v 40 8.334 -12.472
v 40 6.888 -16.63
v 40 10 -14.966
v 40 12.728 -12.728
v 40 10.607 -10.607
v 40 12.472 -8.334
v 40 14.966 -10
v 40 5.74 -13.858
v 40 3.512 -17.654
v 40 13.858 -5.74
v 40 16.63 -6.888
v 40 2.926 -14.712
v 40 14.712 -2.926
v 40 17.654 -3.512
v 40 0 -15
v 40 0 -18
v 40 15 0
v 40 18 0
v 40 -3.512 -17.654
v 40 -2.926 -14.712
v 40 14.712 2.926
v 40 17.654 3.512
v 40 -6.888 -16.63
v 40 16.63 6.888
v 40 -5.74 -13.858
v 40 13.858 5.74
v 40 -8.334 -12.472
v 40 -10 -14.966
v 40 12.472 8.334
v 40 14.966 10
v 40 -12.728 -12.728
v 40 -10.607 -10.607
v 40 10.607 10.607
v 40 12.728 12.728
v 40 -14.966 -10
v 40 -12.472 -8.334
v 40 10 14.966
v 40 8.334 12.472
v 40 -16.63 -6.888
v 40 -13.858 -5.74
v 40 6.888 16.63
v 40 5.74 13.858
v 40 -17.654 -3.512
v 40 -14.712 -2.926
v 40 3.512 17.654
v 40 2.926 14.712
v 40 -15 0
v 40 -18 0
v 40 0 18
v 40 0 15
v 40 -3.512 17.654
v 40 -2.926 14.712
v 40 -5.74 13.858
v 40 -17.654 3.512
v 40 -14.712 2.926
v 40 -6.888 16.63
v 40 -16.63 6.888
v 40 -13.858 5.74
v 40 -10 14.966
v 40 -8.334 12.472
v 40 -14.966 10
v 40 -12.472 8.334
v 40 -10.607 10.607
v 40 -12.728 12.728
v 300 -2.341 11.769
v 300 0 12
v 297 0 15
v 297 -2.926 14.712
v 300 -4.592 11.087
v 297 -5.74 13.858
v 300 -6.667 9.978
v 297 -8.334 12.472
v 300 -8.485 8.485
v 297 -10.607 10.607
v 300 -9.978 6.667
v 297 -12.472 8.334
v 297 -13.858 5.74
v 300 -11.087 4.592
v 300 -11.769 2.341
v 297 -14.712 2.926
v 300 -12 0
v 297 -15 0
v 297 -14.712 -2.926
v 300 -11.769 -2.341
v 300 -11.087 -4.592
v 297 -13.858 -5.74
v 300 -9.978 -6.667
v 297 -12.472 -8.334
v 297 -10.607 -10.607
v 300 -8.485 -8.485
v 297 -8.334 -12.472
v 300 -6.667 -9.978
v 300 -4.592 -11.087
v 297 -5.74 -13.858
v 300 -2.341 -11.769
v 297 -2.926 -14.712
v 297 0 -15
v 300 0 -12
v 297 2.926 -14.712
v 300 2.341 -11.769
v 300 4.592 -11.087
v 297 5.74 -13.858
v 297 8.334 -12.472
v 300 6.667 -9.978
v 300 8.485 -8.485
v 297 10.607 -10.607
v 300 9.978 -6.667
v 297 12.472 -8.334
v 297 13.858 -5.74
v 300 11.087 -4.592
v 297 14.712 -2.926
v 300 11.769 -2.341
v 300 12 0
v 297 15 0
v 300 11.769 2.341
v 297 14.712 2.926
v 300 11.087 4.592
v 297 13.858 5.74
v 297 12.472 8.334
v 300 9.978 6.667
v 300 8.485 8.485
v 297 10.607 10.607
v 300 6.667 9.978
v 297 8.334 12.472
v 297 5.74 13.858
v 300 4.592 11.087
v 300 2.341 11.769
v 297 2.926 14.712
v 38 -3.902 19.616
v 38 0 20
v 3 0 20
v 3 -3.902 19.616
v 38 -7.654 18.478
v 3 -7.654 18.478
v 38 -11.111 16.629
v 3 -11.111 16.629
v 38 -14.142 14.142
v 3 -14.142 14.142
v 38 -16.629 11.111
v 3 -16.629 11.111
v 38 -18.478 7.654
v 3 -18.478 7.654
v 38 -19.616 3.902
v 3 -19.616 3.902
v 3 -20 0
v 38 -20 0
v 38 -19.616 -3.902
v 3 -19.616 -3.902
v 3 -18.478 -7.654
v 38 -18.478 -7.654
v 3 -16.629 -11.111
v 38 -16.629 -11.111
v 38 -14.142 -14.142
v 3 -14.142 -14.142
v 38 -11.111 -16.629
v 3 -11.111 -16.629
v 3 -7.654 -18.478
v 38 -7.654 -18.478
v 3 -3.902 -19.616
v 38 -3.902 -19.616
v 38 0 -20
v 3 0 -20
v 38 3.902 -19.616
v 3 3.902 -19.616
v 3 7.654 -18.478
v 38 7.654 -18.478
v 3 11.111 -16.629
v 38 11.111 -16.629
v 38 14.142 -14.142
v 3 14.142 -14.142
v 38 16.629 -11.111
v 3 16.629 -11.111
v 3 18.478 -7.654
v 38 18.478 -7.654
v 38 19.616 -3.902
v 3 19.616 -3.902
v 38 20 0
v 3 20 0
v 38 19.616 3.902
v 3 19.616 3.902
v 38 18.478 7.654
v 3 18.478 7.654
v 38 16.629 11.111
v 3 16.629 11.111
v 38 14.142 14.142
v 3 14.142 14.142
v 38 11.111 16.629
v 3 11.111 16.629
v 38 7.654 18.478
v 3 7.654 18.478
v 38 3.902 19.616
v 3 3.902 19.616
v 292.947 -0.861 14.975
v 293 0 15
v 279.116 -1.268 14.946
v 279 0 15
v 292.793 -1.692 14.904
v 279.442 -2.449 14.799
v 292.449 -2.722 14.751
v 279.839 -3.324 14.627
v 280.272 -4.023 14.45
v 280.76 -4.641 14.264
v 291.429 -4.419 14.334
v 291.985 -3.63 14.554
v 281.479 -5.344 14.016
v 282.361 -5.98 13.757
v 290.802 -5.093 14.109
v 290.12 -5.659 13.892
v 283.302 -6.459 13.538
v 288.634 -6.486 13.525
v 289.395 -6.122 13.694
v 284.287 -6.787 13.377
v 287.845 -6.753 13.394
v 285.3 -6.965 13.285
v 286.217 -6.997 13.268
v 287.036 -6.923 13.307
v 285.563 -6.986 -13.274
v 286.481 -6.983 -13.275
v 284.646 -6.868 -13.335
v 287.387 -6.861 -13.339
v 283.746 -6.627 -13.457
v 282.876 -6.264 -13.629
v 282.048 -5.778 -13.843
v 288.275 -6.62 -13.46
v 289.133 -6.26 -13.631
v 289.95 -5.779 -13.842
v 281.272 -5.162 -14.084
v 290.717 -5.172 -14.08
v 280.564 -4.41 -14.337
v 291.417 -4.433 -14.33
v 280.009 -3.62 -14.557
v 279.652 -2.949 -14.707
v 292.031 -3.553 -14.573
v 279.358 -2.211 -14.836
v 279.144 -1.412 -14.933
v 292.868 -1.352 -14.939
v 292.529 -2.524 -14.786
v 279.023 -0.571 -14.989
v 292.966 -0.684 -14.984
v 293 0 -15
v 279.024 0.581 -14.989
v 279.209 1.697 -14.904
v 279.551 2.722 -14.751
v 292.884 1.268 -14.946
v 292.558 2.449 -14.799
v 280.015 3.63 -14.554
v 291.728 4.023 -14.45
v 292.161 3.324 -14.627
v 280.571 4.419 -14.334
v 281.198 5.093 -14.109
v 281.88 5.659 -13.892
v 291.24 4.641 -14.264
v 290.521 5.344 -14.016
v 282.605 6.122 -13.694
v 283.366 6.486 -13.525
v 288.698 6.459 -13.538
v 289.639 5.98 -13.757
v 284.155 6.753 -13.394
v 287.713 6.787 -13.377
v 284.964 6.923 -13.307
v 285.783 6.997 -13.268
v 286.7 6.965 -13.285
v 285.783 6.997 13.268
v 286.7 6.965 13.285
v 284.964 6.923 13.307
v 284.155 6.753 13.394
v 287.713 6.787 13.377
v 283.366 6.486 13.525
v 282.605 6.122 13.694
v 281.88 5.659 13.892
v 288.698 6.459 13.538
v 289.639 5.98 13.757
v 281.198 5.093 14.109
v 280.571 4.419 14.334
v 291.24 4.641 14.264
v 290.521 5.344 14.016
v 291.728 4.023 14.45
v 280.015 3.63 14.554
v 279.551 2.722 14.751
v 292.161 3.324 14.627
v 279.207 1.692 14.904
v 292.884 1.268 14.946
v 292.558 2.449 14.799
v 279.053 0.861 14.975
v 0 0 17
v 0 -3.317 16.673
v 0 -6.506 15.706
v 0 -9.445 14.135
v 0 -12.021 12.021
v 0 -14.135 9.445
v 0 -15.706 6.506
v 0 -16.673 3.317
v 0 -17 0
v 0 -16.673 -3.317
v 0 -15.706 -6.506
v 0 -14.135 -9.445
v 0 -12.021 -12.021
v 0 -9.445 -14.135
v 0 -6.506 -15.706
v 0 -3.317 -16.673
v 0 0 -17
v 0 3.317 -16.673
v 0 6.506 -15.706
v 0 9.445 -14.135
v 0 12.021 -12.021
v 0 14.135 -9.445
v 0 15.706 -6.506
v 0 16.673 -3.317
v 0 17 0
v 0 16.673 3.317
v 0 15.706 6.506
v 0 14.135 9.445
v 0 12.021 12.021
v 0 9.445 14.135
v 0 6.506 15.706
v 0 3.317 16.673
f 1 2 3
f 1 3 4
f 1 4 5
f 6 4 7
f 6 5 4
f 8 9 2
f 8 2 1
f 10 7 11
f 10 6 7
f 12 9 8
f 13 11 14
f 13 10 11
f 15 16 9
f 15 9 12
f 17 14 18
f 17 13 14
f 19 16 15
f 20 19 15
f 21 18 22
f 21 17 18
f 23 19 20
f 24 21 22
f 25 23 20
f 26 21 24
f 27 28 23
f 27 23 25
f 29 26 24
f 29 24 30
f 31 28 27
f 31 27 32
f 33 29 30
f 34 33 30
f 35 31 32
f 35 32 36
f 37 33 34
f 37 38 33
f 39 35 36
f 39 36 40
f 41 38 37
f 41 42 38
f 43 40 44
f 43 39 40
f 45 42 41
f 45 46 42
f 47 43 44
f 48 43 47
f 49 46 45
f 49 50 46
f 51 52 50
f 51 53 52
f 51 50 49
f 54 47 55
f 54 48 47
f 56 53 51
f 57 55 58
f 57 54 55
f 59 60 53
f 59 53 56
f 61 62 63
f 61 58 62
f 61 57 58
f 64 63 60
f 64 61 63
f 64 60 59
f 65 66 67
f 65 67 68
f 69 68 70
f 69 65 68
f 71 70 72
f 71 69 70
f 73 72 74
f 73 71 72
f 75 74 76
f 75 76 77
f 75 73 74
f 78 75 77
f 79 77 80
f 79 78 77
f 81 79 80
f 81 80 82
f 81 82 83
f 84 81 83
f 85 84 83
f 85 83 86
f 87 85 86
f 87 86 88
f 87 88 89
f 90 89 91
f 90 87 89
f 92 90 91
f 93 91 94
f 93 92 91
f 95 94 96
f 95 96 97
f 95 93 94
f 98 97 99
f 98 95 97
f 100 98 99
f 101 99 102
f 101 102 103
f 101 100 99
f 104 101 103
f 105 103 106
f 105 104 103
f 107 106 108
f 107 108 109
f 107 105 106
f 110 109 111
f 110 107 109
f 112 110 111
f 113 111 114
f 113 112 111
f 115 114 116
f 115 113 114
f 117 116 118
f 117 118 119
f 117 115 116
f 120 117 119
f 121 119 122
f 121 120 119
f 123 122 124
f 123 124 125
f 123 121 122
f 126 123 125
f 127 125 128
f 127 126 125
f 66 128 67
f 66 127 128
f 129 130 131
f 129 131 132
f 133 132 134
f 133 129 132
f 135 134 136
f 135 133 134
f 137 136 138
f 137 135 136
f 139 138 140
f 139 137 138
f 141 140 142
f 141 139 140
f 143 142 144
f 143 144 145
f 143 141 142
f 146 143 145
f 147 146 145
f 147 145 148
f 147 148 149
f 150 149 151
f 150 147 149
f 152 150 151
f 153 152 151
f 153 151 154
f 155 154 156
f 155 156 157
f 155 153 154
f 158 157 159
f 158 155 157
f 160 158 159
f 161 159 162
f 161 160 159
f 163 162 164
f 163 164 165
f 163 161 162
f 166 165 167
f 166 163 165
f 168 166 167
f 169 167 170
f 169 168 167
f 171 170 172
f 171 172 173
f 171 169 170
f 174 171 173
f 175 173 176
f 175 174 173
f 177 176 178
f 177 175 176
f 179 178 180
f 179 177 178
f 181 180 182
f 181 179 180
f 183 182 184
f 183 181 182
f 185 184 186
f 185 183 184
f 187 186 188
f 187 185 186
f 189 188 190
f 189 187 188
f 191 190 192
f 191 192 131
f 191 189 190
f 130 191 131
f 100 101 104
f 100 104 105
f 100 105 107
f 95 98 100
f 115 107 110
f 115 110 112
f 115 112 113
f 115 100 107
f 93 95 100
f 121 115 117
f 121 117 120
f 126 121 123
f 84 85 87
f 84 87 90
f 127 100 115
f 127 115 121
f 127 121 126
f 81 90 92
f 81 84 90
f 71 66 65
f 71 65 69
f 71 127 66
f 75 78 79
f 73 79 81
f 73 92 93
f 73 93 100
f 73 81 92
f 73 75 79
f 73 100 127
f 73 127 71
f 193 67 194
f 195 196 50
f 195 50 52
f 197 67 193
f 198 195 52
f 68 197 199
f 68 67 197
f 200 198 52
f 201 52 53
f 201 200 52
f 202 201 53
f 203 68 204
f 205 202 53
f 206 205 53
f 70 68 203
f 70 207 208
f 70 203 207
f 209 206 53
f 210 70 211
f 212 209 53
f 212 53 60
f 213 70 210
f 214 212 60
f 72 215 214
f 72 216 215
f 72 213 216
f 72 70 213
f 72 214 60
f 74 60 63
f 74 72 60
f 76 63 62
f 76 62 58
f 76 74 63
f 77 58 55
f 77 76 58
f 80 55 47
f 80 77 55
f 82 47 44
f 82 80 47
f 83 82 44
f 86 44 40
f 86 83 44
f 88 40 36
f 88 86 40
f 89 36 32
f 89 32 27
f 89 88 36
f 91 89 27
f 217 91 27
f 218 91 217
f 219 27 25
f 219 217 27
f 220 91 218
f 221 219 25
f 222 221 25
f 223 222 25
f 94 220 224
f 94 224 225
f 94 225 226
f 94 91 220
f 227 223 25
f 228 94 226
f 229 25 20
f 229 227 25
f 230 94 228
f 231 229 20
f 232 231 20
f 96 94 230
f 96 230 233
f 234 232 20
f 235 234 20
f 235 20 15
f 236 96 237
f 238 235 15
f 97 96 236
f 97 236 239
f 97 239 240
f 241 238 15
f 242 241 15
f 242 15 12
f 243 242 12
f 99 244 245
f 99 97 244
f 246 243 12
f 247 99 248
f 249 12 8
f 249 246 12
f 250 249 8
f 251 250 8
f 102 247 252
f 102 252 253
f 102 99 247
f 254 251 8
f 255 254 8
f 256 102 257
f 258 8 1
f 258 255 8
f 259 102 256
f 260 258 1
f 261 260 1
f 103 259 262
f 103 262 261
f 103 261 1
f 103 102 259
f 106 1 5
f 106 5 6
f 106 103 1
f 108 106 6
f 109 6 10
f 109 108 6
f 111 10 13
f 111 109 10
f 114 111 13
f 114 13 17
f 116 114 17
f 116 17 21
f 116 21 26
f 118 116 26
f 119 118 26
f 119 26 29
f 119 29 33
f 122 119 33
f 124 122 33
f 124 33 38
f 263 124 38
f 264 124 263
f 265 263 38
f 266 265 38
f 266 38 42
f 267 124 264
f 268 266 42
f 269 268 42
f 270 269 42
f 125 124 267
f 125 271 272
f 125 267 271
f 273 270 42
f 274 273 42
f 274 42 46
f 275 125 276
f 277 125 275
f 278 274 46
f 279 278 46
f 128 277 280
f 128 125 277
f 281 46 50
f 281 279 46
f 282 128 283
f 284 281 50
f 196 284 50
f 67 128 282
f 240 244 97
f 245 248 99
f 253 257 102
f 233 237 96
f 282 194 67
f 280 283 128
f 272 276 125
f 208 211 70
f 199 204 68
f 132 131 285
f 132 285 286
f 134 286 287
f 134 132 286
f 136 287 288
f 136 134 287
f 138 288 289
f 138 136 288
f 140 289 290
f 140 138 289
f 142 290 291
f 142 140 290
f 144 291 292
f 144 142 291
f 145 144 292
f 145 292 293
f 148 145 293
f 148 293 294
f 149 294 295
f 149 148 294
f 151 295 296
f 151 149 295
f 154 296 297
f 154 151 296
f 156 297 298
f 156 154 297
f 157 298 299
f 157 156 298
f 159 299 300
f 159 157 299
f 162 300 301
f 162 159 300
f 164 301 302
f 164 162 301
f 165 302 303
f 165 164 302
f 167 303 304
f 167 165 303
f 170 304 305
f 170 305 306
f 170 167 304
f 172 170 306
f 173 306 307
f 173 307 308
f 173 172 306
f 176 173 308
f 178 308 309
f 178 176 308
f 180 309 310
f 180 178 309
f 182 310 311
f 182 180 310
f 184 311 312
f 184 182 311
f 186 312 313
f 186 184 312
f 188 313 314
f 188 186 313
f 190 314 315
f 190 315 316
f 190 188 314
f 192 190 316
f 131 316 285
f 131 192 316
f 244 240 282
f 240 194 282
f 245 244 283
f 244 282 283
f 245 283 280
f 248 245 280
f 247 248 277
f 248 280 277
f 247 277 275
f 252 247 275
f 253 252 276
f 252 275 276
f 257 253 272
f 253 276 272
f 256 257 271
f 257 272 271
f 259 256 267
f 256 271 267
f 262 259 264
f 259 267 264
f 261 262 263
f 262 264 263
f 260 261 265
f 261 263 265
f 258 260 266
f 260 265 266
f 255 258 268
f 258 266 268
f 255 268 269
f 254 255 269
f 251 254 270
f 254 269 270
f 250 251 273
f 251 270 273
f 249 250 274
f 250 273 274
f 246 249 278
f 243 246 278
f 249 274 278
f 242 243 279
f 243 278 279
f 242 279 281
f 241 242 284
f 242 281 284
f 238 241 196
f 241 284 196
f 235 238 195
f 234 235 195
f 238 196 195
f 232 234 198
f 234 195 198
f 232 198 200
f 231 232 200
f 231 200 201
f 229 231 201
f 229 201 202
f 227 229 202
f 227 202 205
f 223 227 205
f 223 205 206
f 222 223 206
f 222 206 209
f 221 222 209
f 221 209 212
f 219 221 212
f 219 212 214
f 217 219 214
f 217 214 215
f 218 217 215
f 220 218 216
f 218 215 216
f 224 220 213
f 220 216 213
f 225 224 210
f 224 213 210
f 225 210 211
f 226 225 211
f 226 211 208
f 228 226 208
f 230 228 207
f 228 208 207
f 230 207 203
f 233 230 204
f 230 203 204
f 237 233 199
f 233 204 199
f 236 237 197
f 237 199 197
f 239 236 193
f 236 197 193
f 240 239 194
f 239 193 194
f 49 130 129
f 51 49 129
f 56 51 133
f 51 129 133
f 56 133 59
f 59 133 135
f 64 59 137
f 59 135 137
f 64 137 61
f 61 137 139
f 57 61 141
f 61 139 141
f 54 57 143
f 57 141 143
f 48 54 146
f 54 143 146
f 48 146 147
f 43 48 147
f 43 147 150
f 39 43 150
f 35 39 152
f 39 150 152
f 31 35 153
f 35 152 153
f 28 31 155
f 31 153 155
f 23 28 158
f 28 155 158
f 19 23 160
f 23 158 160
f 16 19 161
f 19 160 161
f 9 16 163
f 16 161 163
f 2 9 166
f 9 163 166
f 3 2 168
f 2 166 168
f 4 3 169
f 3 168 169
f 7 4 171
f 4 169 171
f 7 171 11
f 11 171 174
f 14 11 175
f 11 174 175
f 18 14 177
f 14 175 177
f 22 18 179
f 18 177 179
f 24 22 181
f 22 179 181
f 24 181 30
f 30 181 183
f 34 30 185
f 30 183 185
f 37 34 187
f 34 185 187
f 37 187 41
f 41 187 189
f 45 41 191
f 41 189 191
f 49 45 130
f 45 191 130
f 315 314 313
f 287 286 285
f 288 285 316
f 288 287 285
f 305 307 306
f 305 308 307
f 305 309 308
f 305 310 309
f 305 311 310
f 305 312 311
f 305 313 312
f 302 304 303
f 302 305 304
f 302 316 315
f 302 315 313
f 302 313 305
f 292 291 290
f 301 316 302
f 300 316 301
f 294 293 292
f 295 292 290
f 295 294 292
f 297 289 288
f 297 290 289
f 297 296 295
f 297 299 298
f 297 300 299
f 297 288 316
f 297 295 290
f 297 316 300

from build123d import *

# Parameters (mm, degrees)
CHANFREIN1_SIZE         = 3
CHANFREIN2_SIZE         = 3
ESQUISSE2_R             = 7
ENL_V_MAT_EXTRU_1_DEPTH = 45
CHANFREIN3_SIZE         = 2


with BuildPart() as part:
    # Esquisse1 → Révolution1 (revolve)
    with BuildSketch(Plane.XY, mode=Mode.PRIVATE) as r_volution1_sk:
        Polygon((0, 0), (0, 20), (40, 20), (40, 15), (300, 15), (300, 0), align=None)
    revolve(r_volution1_sk.sketch.rotate(Axis((0, 0, 0), (1, 0, 0)), 90), axis=Axis((0, 0, 0), (1, 0, 0)))

    # Chanfrein1
    chanfrein1_edges = [part.edges().sort_by_distance(p)[0] for p in [
        (0, 0, -20),
    ]]
    chamfer(chanfrein1_edges, length=CHANFREIN1_SIZE)

    # Chanfrein2
    chanfrein2_edges = [part.edges().sort_by_distance(p)[0] for p in [
        (300, 0, -15),
    ]]
    chamfer(chanfrein2_edges, length=CHANFREIN2_SIZE)

    # Esquisse2 → Enlèv. mat.-Extru.1 (cut, symmetric)
    with BuildSketch(Plane.XY):
        with Locations((286, 0)):
            Circle(ESQUISSE2_R)
    extrude(amount=ENL_V_MAT_EXTRU_1_DEPTH, both=True, mode=Mode.SUBTRACT)

    # Chanfrein3
    chanfrein3_edges = [part.edges().sort_by_distance(p)[0] for p in [
        (40, 0, -20),
    ]]
    chamfer(chanfrein3_edges, length=CHANFREIN3_SIZE)


solid = part.part
